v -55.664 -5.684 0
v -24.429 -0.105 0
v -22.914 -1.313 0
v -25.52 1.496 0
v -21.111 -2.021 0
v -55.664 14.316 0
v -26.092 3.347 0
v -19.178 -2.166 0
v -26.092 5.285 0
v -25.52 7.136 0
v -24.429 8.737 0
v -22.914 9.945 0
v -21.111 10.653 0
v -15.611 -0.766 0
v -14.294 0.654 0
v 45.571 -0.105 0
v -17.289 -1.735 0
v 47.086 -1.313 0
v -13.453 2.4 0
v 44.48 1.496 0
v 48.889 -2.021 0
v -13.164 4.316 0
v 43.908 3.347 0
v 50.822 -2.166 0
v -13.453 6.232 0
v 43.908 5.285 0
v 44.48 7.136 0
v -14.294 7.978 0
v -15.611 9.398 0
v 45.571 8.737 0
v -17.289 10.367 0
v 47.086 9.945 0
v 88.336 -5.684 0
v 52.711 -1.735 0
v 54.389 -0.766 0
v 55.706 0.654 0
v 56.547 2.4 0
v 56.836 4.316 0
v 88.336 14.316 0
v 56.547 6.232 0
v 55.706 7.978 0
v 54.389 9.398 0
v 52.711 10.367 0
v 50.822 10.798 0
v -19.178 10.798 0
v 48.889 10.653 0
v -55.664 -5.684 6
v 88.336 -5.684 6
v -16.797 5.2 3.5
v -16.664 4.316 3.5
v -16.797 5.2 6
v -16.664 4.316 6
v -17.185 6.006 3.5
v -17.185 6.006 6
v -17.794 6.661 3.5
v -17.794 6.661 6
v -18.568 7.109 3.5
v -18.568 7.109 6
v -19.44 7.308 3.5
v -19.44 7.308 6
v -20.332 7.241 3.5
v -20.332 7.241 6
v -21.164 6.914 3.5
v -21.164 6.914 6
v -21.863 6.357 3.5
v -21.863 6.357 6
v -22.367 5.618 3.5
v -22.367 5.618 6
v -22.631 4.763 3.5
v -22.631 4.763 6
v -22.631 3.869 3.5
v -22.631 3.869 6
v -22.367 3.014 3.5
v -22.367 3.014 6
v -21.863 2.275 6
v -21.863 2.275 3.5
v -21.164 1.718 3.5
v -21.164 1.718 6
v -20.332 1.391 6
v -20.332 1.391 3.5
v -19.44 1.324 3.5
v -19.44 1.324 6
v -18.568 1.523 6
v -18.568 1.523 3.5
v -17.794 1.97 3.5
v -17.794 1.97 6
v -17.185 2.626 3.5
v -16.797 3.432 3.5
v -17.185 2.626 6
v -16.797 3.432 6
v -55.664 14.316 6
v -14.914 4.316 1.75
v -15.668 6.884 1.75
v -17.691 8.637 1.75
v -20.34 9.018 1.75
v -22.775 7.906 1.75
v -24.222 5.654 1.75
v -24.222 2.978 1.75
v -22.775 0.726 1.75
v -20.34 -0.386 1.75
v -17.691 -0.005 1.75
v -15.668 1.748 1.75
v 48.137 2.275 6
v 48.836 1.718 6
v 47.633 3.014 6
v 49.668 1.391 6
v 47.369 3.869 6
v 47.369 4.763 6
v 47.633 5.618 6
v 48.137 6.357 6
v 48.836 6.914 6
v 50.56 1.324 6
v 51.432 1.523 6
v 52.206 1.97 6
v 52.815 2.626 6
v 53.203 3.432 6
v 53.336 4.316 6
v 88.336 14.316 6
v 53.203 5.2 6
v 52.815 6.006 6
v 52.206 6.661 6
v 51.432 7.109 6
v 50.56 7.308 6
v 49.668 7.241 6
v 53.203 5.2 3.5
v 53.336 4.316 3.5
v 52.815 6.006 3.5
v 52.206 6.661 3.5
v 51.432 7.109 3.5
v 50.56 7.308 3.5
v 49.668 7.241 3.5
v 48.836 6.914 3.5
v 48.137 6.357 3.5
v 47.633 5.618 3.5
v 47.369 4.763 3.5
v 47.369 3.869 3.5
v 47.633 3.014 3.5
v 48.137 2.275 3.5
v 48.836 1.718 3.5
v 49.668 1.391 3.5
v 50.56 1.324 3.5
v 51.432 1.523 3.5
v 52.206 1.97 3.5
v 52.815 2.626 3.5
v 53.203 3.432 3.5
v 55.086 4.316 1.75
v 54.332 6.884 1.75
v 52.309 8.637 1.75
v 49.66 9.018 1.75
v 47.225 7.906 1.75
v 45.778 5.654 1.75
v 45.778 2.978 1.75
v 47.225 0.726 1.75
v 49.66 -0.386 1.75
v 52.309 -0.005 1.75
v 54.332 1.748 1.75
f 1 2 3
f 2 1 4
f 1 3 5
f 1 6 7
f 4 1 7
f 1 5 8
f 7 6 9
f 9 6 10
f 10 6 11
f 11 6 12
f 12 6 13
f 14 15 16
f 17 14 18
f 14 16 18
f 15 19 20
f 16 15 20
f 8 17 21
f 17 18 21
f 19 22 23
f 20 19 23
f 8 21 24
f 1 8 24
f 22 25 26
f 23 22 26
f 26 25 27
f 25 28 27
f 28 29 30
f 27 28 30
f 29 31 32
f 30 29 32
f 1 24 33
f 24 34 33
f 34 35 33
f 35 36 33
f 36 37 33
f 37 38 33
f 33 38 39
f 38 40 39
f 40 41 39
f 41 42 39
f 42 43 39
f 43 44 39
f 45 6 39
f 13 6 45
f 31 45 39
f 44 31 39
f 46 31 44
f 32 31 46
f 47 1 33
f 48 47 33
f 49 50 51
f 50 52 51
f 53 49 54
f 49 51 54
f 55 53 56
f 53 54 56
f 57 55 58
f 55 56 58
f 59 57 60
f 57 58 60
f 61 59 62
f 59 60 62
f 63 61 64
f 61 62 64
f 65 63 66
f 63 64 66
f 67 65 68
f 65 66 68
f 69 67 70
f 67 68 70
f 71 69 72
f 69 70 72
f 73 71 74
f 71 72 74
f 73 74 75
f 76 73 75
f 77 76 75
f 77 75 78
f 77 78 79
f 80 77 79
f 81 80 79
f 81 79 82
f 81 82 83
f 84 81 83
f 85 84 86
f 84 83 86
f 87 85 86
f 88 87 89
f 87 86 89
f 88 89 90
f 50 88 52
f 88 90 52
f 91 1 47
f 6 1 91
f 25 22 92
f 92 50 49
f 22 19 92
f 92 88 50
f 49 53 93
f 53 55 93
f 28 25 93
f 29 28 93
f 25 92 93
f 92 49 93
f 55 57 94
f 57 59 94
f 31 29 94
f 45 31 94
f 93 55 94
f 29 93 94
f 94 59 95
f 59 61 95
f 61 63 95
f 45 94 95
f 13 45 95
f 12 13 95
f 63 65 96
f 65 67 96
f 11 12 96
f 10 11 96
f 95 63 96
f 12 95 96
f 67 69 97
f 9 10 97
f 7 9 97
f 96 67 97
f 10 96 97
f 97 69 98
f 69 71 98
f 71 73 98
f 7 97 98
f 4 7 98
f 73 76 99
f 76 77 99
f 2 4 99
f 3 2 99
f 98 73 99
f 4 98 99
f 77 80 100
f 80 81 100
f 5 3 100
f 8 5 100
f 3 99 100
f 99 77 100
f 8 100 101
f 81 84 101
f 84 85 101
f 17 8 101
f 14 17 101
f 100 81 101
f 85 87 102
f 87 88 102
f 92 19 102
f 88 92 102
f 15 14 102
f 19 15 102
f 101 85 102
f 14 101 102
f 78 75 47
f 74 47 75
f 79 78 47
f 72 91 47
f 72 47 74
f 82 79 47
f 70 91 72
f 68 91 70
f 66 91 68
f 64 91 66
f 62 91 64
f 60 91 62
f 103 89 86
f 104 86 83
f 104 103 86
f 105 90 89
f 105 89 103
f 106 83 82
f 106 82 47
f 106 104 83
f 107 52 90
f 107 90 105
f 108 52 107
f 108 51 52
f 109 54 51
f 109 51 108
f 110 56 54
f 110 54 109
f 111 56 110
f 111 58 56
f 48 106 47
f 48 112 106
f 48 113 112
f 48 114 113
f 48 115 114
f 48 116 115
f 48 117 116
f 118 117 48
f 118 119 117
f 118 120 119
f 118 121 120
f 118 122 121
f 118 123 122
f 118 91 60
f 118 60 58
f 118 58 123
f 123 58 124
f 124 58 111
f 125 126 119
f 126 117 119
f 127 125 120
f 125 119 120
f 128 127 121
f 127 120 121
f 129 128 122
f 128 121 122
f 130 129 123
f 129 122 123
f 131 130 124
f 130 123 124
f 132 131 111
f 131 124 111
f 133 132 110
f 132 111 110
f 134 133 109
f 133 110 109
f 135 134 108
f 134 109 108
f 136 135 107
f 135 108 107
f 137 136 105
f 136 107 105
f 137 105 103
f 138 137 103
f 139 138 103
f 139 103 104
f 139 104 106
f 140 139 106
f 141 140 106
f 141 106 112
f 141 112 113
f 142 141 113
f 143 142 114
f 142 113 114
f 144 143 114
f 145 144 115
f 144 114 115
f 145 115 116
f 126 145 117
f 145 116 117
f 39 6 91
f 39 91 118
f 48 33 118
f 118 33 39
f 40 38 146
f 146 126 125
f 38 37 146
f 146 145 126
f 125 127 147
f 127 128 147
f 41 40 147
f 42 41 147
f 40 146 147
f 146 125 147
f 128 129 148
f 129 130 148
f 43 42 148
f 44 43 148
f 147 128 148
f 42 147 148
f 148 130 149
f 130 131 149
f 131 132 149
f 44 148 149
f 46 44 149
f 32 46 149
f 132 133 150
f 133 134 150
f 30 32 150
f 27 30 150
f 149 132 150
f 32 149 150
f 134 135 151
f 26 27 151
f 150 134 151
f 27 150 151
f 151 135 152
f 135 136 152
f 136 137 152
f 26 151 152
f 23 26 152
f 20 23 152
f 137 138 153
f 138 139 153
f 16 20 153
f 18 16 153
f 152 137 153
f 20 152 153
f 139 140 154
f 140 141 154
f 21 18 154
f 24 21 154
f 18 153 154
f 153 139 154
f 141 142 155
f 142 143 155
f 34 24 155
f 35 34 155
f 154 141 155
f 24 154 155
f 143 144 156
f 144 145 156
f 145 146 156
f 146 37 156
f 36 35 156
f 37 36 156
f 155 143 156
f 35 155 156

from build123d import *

# Parameters (mm, degrees)
SKETCH1_W                                           = 144
SKETCH1_H                                           = 20
BOSS_EXTRUDE1_DEPTH                                 = 6
CSK_FOR_M6_COUNTERSUNK_FLAT_HEAD_SCREW1_D           = 6
CSK_FOR_M6_COUNTERSUNK_FLAT_HEAD_SCREW1_DEPTH       = 17.5
CSK_FOR_M6_COUNTERSUNK_FLAT_HEAD_SCREW1_CSINK_D     = 13
CSK_FOR_M6_COUNTERSUNK_FLAT_HEAD_SCREW1_CSINK_ANGLE = 90
CSK_FOR_M6_COUNTERSUNK_FLAT_HEAD_SCREW1_TIP         = 1.802581857


with BuildPart() as part:
    # Sketch1 → Boss-Extrude1 (new body)
    with BuildSketch(Plane.XY):
        with Locations((16.335821826, 4.315981806)):
            Rectangle(SKETCH1_W, SKETCH1_H)
    extrude(amount=BOSS_EXTRUDE1_DEPTH)

    # CSK for M6 Countersunk Flat Head Screw1
    with Locations(Plane(origin=(0, 0, 0), x_dir=(-1, 0, 0), z_dir=(0, 0, -1))):
        with Locations((-50.335821826, 4.315981806), (19.664178174, 4.315981806)):
            CounterSinkHole(CSK_FOR_M6_COUNTERSUNK_FLAT_HEAD_SCREW1_D / 2, CSK_FOR_M6_COUNTERSUNK_FLAT_HEAD_SCREW1_CSINK_D / 2, depth=CSK_FOR_M6_COUNTERSUNK_FLAT_HEAD_SCREW1_DEPTH, counter_sink_angle=CSK_FOR_M6_COUNTERSUNK_FLAT_HEAD_SCREW1_CSINK_ANGLE)
            with Locations((0, 0, -(CSK_FOR_M6_COUNTERSUNK_FLAT_HEAD_SCREW1_DEPTH + CSK_FOR_M6_COUNTERSUNK_FLAT_HEAD_SCREW1_TIP / 2))):  # 118° drill point
                Cone(0, CSK_FOR_M6_COUNTERSUNK_FLAT_HEAD_SCREW1_D / 2, CSK_FOR_M6_COUNTERSUNK_FLAT_HEAD_SCREW1_TIP, mode=Mode.SUBTRACT)


solid = part.part
